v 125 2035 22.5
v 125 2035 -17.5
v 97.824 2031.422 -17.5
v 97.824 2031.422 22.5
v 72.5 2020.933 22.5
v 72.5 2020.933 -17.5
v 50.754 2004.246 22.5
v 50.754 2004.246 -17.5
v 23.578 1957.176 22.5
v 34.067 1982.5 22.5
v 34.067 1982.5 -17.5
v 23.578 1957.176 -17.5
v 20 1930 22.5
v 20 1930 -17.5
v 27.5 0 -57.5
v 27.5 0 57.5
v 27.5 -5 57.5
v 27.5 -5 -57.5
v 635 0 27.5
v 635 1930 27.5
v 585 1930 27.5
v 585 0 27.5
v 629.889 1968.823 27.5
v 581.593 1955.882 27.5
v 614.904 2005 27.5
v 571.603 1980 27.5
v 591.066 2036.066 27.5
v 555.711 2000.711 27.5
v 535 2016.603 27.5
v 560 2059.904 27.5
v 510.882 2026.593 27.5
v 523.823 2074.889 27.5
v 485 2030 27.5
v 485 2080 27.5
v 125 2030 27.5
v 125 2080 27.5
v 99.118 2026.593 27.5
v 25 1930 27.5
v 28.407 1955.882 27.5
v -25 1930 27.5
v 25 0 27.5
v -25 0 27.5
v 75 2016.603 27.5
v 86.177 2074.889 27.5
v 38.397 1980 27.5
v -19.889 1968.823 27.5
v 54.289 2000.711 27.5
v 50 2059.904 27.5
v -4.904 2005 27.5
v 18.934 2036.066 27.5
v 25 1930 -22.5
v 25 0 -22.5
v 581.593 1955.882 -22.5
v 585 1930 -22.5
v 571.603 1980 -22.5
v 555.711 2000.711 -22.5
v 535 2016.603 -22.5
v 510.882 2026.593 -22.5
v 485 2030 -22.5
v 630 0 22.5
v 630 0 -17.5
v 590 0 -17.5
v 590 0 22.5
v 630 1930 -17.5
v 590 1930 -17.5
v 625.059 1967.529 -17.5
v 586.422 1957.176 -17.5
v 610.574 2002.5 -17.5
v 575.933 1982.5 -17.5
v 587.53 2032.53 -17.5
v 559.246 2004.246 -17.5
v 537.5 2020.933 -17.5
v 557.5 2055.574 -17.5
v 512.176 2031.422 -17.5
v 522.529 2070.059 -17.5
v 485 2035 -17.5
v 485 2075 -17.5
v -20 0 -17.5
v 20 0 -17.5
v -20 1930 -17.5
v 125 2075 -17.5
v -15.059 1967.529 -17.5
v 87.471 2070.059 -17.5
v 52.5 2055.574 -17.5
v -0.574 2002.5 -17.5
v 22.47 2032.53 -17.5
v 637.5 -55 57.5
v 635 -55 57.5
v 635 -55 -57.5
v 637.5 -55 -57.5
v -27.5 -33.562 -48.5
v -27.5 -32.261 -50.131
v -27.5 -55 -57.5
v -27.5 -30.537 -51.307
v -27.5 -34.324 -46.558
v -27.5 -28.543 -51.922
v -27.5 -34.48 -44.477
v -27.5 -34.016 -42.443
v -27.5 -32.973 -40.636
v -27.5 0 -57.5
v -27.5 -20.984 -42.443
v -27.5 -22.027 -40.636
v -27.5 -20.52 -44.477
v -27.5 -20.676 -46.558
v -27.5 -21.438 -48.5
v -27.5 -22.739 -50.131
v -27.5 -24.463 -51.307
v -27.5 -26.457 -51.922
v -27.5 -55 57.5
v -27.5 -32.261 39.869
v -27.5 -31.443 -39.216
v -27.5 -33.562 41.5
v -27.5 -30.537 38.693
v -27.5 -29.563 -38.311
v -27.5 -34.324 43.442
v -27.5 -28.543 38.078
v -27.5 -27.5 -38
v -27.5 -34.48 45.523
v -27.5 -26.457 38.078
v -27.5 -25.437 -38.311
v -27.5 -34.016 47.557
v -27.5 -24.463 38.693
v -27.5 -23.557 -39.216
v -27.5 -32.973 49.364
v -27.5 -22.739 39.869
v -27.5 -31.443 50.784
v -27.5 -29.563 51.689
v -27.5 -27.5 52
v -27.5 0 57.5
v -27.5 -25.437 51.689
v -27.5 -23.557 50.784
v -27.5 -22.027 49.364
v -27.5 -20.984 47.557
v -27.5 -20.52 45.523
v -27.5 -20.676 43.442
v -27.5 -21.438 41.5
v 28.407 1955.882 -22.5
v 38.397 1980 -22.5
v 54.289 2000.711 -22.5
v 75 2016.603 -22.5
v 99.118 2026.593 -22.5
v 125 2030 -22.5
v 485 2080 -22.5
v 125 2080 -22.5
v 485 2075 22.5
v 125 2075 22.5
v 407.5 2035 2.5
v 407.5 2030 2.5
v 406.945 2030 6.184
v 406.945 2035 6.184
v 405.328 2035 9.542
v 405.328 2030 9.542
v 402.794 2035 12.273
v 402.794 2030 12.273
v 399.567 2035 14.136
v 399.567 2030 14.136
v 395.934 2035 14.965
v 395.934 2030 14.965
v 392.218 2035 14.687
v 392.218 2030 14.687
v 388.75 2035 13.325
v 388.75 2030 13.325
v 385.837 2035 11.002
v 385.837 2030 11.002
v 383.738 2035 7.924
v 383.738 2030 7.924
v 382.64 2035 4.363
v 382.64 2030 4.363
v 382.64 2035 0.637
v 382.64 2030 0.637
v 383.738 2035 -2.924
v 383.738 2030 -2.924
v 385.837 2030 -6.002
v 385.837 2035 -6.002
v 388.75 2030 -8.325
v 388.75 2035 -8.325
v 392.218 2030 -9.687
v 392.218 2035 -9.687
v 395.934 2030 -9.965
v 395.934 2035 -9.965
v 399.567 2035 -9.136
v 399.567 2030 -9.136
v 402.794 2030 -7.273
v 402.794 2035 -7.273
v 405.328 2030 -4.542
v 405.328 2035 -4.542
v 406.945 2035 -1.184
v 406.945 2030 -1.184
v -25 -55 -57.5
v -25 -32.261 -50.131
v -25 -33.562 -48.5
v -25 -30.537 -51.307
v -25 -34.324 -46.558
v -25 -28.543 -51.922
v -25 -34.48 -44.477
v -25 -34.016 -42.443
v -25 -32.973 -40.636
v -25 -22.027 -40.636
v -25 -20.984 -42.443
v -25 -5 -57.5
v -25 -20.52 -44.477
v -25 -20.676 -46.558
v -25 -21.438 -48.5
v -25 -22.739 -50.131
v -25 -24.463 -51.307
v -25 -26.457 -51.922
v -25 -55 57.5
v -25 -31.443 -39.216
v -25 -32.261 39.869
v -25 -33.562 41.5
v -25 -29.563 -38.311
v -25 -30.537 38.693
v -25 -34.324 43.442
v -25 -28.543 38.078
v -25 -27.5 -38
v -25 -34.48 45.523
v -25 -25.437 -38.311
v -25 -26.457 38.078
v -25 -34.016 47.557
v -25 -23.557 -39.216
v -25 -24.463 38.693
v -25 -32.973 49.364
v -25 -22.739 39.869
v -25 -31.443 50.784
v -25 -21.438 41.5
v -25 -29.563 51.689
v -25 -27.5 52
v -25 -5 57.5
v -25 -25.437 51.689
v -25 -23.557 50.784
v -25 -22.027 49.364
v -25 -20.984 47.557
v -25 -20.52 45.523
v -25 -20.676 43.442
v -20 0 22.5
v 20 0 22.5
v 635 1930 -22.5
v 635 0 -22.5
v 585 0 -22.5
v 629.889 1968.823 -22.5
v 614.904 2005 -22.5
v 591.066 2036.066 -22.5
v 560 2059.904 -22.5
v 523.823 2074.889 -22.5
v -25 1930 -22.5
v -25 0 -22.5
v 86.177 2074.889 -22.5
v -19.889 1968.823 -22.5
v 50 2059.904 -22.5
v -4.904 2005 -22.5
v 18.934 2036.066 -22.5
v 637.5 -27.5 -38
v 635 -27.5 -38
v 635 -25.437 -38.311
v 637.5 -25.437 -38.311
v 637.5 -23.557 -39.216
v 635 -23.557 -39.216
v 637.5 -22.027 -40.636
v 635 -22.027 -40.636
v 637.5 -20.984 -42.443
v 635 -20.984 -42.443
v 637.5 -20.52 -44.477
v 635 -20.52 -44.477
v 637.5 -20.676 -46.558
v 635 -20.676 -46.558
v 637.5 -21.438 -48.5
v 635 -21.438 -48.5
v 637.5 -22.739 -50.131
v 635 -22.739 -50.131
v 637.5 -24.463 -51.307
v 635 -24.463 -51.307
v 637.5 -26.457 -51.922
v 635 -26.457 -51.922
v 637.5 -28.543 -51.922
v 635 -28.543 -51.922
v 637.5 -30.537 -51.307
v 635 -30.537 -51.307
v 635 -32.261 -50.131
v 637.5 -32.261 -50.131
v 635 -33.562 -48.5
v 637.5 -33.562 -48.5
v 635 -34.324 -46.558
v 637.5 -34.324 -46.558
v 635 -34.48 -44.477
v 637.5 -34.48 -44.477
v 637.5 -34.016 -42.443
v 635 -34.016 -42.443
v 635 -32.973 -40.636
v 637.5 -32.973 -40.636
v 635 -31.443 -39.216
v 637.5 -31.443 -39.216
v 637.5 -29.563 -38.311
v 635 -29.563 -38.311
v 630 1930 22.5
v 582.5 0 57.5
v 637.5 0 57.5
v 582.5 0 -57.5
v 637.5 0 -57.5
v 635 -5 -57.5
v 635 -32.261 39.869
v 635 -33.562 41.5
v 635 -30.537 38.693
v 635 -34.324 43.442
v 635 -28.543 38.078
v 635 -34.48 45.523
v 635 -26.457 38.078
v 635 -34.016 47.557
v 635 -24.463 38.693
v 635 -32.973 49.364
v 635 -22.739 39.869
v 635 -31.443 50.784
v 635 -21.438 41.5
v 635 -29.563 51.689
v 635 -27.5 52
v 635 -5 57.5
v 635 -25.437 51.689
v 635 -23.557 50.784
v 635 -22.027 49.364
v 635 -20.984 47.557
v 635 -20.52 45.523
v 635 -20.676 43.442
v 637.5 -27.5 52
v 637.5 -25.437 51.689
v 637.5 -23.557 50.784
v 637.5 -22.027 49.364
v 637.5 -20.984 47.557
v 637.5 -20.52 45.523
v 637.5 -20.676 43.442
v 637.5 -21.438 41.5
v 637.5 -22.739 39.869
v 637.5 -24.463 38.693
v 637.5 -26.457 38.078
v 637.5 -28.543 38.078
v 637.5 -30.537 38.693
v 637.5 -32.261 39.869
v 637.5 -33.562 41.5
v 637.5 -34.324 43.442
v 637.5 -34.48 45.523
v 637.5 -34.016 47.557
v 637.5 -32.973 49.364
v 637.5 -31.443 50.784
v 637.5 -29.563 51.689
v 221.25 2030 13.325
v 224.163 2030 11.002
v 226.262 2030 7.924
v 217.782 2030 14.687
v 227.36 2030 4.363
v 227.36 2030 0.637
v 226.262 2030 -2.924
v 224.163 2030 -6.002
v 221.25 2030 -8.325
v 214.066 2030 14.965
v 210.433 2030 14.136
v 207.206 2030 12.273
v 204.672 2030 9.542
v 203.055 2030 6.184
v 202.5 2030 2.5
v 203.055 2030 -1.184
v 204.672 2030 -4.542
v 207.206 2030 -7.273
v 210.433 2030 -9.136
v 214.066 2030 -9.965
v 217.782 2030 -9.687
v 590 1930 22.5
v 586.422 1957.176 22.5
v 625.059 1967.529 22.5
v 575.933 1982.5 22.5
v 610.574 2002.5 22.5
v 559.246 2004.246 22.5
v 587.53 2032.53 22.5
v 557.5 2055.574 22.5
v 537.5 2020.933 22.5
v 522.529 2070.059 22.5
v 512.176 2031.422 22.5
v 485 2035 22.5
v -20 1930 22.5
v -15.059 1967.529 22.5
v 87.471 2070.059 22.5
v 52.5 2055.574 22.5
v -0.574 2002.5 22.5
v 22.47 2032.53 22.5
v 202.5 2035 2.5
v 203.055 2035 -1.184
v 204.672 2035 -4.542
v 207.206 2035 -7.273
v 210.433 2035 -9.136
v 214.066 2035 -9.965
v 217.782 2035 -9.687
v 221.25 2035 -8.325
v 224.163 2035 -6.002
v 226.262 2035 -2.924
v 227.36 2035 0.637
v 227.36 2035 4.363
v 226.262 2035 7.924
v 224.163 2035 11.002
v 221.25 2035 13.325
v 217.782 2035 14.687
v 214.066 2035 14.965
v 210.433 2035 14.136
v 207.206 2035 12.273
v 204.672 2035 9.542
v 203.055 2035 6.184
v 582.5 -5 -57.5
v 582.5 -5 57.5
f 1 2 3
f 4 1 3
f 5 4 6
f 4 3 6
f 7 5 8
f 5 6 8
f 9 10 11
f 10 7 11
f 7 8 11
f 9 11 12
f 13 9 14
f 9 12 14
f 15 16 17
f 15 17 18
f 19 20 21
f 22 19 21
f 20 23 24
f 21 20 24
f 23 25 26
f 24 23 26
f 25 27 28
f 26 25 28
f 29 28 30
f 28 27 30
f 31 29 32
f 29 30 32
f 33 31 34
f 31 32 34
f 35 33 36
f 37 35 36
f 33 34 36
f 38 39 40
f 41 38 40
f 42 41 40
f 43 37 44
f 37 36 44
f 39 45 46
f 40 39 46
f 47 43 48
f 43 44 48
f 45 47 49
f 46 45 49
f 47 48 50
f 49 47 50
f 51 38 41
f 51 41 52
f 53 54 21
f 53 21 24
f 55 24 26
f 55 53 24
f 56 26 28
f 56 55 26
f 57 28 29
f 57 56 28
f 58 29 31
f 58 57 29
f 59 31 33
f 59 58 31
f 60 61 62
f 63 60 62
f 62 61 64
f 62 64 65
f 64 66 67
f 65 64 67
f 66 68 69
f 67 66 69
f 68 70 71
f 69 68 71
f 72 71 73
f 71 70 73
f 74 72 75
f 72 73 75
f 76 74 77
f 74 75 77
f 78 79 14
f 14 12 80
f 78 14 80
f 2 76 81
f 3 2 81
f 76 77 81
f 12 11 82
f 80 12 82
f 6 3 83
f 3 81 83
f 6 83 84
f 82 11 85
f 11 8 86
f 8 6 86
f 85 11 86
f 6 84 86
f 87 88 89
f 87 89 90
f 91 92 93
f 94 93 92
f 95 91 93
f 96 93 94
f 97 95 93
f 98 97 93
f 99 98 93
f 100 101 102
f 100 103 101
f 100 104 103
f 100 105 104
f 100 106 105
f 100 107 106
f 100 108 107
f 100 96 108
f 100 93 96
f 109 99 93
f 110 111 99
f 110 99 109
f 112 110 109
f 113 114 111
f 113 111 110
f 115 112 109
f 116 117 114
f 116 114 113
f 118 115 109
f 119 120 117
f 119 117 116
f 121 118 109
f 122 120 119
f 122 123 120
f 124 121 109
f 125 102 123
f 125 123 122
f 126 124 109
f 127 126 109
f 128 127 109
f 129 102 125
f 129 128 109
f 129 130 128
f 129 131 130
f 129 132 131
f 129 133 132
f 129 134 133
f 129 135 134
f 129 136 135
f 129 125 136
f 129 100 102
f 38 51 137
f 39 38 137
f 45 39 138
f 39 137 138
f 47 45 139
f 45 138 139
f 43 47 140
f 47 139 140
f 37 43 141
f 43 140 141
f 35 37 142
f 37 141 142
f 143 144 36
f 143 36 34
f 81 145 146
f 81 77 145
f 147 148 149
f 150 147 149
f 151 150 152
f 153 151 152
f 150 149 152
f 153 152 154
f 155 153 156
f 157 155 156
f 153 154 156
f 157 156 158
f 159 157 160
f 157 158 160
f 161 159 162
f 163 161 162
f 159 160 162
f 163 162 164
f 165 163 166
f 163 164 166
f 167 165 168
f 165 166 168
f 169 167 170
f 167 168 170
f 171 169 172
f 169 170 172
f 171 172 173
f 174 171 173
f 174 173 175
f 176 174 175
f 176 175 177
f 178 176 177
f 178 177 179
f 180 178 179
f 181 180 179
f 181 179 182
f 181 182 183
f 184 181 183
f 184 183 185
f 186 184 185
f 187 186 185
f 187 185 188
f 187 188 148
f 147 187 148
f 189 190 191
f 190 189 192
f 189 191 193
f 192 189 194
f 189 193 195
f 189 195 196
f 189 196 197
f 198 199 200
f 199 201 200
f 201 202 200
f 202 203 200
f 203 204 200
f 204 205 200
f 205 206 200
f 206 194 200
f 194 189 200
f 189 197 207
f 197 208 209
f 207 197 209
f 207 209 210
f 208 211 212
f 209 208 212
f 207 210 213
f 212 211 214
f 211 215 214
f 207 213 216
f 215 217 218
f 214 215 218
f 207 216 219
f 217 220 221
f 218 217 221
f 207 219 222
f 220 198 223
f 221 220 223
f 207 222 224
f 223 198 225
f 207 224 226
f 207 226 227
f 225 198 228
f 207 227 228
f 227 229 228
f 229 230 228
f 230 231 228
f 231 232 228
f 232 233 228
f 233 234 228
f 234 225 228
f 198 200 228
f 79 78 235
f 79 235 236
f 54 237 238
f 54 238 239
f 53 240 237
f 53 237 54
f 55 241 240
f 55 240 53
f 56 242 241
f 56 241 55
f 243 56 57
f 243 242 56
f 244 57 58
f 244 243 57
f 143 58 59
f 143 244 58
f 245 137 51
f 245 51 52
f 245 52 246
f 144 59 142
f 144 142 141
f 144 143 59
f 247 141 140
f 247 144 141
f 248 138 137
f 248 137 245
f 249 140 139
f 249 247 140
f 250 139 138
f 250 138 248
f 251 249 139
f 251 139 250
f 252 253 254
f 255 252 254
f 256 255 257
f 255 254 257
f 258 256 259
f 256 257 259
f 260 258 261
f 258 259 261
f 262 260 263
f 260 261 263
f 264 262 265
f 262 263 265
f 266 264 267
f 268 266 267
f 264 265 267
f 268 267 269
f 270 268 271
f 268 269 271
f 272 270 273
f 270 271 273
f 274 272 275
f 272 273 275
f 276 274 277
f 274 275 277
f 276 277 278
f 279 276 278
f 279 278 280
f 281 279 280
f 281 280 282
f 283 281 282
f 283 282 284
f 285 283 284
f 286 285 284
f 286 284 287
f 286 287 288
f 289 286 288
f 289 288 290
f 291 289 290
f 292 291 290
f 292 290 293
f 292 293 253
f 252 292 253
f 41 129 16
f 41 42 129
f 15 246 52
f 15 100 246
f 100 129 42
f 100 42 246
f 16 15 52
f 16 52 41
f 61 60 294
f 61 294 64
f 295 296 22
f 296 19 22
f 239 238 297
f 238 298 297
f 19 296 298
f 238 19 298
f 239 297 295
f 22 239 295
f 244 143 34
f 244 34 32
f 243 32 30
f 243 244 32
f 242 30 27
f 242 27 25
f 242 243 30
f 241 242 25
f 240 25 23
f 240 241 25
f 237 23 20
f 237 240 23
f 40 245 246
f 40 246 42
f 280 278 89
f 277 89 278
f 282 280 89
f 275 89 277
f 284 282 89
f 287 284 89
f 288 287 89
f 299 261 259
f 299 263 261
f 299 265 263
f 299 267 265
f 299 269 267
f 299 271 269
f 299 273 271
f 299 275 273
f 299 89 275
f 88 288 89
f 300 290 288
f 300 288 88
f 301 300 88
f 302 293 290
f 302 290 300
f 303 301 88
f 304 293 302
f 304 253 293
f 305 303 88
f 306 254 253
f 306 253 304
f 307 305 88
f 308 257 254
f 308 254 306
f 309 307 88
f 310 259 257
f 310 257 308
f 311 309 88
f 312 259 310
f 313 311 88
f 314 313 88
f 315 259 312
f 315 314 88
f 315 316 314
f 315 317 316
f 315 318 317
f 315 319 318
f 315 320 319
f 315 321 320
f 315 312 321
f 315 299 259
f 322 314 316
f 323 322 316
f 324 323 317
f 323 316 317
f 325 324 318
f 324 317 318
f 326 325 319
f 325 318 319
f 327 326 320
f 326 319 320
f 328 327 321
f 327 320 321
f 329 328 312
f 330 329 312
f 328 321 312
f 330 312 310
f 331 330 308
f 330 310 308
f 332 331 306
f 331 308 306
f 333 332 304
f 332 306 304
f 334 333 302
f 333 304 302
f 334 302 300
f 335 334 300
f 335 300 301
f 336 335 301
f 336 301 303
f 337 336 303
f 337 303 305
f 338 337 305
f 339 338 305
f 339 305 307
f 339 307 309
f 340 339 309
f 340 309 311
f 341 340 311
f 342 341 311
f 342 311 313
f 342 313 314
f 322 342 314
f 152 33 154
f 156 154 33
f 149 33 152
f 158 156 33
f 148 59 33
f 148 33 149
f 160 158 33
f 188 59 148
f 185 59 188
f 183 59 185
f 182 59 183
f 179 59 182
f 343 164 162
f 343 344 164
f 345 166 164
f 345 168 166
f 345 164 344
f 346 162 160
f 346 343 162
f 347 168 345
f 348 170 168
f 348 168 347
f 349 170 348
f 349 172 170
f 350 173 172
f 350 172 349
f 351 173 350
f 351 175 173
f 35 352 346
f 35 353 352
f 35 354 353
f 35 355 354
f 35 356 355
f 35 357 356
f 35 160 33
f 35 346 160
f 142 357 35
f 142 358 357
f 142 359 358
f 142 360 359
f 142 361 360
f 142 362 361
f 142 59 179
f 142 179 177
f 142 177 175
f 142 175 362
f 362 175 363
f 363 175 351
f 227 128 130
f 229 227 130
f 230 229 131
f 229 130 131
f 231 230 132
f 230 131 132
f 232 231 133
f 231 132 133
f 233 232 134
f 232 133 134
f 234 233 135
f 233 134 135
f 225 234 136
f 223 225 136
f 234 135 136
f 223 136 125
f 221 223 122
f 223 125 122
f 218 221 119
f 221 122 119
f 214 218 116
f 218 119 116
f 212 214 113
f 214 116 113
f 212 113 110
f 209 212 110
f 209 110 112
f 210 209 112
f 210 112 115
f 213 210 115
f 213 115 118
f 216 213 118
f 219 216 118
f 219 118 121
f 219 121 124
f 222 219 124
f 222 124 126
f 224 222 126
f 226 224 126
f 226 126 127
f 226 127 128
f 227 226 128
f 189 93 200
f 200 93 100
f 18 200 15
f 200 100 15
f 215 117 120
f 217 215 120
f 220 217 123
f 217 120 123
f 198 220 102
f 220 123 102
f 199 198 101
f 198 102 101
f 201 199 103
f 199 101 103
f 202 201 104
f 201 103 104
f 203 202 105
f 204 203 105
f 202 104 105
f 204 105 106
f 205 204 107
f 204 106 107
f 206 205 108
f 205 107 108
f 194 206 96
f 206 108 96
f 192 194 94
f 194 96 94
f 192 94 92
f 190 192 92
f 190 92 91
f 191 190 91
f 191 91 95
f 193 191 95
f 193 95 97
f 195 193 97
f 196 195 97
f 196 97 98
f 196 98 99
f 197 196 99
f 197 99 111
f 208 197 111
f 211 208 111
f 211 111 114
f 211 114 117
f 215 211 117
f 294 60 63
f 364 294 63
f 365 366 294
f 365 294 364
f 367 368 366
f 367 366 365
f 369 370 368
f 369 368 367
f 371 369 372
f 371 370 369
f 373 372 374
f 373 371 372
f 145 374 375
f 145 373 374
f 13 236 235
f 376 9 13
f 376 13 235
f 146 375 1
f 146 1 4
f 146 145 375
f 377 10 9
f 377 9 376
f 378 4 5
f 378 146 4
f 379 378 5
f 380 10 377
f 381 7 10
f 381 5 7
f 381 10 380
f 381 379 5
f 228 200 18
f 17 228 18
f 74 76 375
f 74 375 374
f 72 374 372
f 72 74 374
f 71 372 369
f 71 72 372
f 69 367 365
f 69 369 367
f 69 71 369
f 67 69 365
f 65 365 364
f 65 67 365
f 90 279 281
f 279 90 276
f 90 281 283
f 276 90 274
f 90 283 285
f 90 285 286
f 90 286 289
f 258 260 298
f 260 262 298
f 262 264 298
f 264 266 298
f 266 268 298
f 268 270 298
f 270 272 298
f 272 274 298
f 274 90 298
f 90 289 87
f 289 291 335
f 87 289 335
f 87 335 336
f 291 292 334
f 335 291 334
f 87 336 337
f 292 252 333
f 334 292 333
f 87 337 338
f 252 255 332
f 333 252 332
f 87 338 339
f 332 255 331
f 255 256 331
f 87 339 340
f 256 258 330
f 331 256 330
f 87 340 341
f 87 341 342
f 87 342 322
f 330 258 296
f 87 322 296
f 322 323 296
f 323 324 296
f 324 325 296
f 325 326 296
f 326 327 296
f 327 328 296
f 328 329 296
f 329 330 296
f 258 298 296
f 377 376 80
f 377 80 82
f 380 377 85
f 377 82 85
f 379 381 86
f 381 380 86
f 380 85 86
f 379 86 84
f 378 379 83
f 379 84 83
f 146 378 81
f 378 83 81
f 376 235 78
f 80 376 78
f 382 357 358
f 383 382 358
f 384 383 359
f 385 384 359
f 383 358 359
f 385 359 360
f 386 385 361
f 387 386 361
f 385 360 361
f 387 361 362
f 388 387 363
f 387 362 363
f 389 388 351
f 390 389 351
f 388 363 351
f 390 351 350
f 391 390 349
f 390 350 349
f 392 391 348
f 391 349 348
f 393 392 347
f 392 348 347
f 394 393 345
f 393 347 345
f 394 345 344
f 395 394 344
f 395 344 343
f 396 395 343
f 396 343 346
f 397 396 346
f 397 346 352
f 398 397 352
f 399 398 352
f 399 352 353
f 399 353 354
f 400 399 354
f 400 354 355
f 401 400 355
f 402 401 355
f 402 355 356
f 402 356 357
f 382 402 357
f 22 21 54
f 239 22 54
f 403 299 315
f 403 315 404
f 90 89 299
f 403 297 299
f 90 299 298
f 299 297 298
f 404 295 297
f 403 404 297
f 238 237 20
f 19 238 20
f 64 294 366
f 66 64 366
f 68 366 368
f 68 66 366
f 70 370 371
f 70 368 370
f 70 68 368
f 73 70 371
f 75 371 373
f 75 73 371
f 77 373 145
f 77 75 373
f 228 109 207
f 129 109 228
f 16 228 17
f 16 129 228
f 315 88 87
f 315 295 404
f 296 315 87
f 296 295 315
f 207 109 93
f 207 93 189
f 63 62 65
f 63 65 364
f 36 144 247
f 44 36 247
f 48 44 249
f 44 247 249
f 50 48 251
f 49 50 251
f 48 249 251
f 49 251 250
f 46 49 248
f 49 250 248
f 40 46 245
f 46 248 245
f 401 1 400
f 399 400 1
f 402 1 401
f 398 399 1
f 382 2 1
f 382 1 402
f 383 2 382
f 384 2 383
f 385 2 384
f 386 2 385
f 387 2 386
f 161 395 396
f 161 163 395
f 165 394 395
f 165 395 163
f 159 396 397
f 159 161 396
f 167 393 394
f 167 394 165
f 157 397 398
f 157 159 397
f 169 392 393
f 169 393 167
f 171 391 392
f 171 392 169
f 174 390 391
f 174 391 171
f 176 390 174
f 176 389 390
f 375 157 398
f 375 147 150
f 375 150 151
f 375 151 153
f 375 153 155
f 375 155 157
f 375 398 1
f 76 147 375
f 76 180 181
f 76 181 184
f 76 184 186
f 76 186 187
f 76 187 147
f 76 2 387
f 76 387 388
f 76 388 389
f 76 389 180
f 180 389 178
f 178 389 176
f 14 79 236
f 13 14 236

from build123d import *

# Parameters (mm, degrees)
SKETCH2_W           = 55
SKETCH2_H           = 115
BOSS_EXTRUDE1_DEPTH = 5
SKETCH5_W           = 50
SKETCH5_H           = 50
SKETCH5_W_2         = 40
SKETCH5_H_2         = 40
SWEEP2_START        = -22.5
SWEEP2_DEPTH        = 50
SWEEP2_2_DEPTH      = 5
SWEEP2_START_2      = 22.5
SWEEP2_3_DEPTH      = 5
SKETCH11_R          = 12.5
CUT_EXTRUDE2_DEPTH  = 25
SKETCH12_R          = 12.5
CUT_EXTRUDE3_DEPTH  = 25
SKETCH13_W          = 2.5
SKETCH13_H          = 115
BOSS_EXTRUDE2_DEPTH = 50
SKETCH15_W          = 2.5
SKETCH15_H          = 115
BOSS_EXTRUDE3_DEPTH = 50
SKETCH14_R          = 7
CUT_EXTRUDE4_DEPTH  = 2185.475051357


# Read off the part's stored shape, not the designer's step: Sweep2
with BuildPart() as part:
    # Sketch2 → Boss-Extrude1 (new body)
    with BuildSketch(Plane(origin=(0, 0, 0), x_dir=(1, 0, 0), z_dir=(0, 1, 0))):
        Rectangle(SKETCH2_W, SKETCH2_H)
    extrude(amount=-BOSS_EXTRUDE1_DEPTH)

    # Sweep1: sweep along a path in Sketch7
    with BuildLine(Plane(origin=(0, 0, 0), x_dir=(0, 0, -1), z_dir=(1, 0, 0))) as sweep1_path:
        Line((-2.5, 0), (-2.5, 1930))
    # Sketch5 → Sweep1 (sweep)
    with BuildSketch(Plane(origin=(0, 0, 0), x_dir=(1, 0, 0), z_dir=(0, 1, 0))):
        with Locations((0, -2.5)):
            Rectangle(SKETCH5_W, SKETCH5_H)
        with Locations((0, -2.5)):
            Rectangle(SKETCH5_W_2, SKETCH5_H_2, mode=Mode.SUBTRACT)
    sweep(path=sweep1_path.line)

    # Sweep2 outline → Sweep2 (add)
    with BuildSketch(Plane.XY.offset(SWEEP2_START)):
        with BuildLine():
            ThreePointArc((125, 2080), (18.933982822, 2036.066017178), (-25, 1930))
            Line((-25, 1930), (-20, 1930))
            ThreePointArc((-20, 1930), (22.469516728, 2032.530483272), (125, 2075))
            Line((125, 2075), (305, 2075))
            Line((305, 2075), (305, 2080))
            Line((305, 2080), (125, 2080))
        make_face()
        with BuildLine():
            ThreePointArc((125, 2035), (50.753787975, 2004.246212025), (20, 1930))
            Line((20, 1930), (25, 1930))
            ThreePointArc((25, 1930), (54.289321881, 2000.710678119), (125, 2030))
            Line((125, 2030), (305, 2030))
            Line((305, 2030), (305, 2035))
            Line((305, 2035), (125, 2035))
        make_face()
    extrude(amount=SWEEP2_DEPTH)

    # Sweep2 2 outline → Sweep2 2 (add)
    with BuildSketch(Plane.XY.offset(SWEEP2_START)):
        with BuildLine():
            ThreePointArc((125, 2075), (22.469516728, 2032.530483272), (-20, 1930))
            Line((-20, 1930), (20, 1930))
            ThreePointArc((20, 1930), (50.753787975, 2004.246212025), (125, 2035))
            Line((125, 2035), (305, 2035))
            Line((305, 2035), (305, 2075))
            Line((305, 2075), (125, 2075))
        make_face()
    extrude(amount=SWEEP2_2_DEPTH)

    # Sweep2 3 outline → Sweep2 3 (add)
    with BuildSketch(Plane.XY.offset(SWEEP2_START_2)):
        with BuildLine():
            ThreePointArc((125, 2075), (22.469516728, 2032.530483272), (-20, 1930))
            Line((-20, 1930), (20, 1930))
            ThreePointArc((20, 1930), (50.753787975, 2004.246212025), (125, 2035))
            Line((125, 2035), (305, 2035))
            Line((305, 2035), (305, 2075))
            Line((305, 2075), (125, 2075))
        make_face()
    extrude(amount=SWEEP2_3_DEPTH)

    # Mirror1: part across plane


with BuildPart() as part_1:
    add(part.part)
    add(part.part.mirror(Plane(origin=(305, 2055, 0), x_dir=(0, 0, 1), z_dir=(1, 0, 0))))

    # Sketch11 → Cut-Extrude2 (cut)
    with BuildSketch(Plane.XZ.offset(-2030)):
        with Locations((395, 2.5)):
            Circle(SKETCH11_R)
    extrude(amount=-CUT_EXTRUDE2_DEPTH, mode=Mode.SUBTRACT)

    # Sketch12 → Cut-Extrude3 (cut)
    with BuildSketch(Plane.XZ.offset(-2030)):
        with Locations((395, 2.5)):
            Circle(SKETCH12_R)
        with Locations(Location((215, 2.5, 0), (0, 0, 180))):
            Circle(SKETCH12_R)
    extrude(amount=-CUT_EXTRUDE3_DEPTH, mode=Mode.SUBTRACT)

    # Sketch13 → Boss-Extrude2 (add)
    with BuildSketch(Plane.XZ.offset(5)):
        with Locations((-26.25, 0)):
            Rectangle(SKETCH13_W, SKETCH13_H)
    extrude(amount=BOSS_EXTRUDE2_DEPTH)

    # Sketch15 → Boss-Extrude3 (add)
    with BuildSketch(Plane.XZ.offset(5)):
        with Locations((636.25, 0)):
            Rectangle(SKETCH15_W, SKETCH15_H)
    extrude(amount=BOSS_EXTRUDE3_DEPTH)

    # Sketch14 → Cut-Extrude4 (cut, through all)
    with BuildSketch(Plane.ZY.offset(27.5)):
        with Locations((-45, -27.5)):
            Circle(SKETCH14_R)
        with Locations((45, -27.5)):
            Circle(SKETCH14_R)
    extrude(amount=-CUT_EXTRUDE4_DEPTH, mode=Mode.SUBTRACT)


solid = part_1.part
